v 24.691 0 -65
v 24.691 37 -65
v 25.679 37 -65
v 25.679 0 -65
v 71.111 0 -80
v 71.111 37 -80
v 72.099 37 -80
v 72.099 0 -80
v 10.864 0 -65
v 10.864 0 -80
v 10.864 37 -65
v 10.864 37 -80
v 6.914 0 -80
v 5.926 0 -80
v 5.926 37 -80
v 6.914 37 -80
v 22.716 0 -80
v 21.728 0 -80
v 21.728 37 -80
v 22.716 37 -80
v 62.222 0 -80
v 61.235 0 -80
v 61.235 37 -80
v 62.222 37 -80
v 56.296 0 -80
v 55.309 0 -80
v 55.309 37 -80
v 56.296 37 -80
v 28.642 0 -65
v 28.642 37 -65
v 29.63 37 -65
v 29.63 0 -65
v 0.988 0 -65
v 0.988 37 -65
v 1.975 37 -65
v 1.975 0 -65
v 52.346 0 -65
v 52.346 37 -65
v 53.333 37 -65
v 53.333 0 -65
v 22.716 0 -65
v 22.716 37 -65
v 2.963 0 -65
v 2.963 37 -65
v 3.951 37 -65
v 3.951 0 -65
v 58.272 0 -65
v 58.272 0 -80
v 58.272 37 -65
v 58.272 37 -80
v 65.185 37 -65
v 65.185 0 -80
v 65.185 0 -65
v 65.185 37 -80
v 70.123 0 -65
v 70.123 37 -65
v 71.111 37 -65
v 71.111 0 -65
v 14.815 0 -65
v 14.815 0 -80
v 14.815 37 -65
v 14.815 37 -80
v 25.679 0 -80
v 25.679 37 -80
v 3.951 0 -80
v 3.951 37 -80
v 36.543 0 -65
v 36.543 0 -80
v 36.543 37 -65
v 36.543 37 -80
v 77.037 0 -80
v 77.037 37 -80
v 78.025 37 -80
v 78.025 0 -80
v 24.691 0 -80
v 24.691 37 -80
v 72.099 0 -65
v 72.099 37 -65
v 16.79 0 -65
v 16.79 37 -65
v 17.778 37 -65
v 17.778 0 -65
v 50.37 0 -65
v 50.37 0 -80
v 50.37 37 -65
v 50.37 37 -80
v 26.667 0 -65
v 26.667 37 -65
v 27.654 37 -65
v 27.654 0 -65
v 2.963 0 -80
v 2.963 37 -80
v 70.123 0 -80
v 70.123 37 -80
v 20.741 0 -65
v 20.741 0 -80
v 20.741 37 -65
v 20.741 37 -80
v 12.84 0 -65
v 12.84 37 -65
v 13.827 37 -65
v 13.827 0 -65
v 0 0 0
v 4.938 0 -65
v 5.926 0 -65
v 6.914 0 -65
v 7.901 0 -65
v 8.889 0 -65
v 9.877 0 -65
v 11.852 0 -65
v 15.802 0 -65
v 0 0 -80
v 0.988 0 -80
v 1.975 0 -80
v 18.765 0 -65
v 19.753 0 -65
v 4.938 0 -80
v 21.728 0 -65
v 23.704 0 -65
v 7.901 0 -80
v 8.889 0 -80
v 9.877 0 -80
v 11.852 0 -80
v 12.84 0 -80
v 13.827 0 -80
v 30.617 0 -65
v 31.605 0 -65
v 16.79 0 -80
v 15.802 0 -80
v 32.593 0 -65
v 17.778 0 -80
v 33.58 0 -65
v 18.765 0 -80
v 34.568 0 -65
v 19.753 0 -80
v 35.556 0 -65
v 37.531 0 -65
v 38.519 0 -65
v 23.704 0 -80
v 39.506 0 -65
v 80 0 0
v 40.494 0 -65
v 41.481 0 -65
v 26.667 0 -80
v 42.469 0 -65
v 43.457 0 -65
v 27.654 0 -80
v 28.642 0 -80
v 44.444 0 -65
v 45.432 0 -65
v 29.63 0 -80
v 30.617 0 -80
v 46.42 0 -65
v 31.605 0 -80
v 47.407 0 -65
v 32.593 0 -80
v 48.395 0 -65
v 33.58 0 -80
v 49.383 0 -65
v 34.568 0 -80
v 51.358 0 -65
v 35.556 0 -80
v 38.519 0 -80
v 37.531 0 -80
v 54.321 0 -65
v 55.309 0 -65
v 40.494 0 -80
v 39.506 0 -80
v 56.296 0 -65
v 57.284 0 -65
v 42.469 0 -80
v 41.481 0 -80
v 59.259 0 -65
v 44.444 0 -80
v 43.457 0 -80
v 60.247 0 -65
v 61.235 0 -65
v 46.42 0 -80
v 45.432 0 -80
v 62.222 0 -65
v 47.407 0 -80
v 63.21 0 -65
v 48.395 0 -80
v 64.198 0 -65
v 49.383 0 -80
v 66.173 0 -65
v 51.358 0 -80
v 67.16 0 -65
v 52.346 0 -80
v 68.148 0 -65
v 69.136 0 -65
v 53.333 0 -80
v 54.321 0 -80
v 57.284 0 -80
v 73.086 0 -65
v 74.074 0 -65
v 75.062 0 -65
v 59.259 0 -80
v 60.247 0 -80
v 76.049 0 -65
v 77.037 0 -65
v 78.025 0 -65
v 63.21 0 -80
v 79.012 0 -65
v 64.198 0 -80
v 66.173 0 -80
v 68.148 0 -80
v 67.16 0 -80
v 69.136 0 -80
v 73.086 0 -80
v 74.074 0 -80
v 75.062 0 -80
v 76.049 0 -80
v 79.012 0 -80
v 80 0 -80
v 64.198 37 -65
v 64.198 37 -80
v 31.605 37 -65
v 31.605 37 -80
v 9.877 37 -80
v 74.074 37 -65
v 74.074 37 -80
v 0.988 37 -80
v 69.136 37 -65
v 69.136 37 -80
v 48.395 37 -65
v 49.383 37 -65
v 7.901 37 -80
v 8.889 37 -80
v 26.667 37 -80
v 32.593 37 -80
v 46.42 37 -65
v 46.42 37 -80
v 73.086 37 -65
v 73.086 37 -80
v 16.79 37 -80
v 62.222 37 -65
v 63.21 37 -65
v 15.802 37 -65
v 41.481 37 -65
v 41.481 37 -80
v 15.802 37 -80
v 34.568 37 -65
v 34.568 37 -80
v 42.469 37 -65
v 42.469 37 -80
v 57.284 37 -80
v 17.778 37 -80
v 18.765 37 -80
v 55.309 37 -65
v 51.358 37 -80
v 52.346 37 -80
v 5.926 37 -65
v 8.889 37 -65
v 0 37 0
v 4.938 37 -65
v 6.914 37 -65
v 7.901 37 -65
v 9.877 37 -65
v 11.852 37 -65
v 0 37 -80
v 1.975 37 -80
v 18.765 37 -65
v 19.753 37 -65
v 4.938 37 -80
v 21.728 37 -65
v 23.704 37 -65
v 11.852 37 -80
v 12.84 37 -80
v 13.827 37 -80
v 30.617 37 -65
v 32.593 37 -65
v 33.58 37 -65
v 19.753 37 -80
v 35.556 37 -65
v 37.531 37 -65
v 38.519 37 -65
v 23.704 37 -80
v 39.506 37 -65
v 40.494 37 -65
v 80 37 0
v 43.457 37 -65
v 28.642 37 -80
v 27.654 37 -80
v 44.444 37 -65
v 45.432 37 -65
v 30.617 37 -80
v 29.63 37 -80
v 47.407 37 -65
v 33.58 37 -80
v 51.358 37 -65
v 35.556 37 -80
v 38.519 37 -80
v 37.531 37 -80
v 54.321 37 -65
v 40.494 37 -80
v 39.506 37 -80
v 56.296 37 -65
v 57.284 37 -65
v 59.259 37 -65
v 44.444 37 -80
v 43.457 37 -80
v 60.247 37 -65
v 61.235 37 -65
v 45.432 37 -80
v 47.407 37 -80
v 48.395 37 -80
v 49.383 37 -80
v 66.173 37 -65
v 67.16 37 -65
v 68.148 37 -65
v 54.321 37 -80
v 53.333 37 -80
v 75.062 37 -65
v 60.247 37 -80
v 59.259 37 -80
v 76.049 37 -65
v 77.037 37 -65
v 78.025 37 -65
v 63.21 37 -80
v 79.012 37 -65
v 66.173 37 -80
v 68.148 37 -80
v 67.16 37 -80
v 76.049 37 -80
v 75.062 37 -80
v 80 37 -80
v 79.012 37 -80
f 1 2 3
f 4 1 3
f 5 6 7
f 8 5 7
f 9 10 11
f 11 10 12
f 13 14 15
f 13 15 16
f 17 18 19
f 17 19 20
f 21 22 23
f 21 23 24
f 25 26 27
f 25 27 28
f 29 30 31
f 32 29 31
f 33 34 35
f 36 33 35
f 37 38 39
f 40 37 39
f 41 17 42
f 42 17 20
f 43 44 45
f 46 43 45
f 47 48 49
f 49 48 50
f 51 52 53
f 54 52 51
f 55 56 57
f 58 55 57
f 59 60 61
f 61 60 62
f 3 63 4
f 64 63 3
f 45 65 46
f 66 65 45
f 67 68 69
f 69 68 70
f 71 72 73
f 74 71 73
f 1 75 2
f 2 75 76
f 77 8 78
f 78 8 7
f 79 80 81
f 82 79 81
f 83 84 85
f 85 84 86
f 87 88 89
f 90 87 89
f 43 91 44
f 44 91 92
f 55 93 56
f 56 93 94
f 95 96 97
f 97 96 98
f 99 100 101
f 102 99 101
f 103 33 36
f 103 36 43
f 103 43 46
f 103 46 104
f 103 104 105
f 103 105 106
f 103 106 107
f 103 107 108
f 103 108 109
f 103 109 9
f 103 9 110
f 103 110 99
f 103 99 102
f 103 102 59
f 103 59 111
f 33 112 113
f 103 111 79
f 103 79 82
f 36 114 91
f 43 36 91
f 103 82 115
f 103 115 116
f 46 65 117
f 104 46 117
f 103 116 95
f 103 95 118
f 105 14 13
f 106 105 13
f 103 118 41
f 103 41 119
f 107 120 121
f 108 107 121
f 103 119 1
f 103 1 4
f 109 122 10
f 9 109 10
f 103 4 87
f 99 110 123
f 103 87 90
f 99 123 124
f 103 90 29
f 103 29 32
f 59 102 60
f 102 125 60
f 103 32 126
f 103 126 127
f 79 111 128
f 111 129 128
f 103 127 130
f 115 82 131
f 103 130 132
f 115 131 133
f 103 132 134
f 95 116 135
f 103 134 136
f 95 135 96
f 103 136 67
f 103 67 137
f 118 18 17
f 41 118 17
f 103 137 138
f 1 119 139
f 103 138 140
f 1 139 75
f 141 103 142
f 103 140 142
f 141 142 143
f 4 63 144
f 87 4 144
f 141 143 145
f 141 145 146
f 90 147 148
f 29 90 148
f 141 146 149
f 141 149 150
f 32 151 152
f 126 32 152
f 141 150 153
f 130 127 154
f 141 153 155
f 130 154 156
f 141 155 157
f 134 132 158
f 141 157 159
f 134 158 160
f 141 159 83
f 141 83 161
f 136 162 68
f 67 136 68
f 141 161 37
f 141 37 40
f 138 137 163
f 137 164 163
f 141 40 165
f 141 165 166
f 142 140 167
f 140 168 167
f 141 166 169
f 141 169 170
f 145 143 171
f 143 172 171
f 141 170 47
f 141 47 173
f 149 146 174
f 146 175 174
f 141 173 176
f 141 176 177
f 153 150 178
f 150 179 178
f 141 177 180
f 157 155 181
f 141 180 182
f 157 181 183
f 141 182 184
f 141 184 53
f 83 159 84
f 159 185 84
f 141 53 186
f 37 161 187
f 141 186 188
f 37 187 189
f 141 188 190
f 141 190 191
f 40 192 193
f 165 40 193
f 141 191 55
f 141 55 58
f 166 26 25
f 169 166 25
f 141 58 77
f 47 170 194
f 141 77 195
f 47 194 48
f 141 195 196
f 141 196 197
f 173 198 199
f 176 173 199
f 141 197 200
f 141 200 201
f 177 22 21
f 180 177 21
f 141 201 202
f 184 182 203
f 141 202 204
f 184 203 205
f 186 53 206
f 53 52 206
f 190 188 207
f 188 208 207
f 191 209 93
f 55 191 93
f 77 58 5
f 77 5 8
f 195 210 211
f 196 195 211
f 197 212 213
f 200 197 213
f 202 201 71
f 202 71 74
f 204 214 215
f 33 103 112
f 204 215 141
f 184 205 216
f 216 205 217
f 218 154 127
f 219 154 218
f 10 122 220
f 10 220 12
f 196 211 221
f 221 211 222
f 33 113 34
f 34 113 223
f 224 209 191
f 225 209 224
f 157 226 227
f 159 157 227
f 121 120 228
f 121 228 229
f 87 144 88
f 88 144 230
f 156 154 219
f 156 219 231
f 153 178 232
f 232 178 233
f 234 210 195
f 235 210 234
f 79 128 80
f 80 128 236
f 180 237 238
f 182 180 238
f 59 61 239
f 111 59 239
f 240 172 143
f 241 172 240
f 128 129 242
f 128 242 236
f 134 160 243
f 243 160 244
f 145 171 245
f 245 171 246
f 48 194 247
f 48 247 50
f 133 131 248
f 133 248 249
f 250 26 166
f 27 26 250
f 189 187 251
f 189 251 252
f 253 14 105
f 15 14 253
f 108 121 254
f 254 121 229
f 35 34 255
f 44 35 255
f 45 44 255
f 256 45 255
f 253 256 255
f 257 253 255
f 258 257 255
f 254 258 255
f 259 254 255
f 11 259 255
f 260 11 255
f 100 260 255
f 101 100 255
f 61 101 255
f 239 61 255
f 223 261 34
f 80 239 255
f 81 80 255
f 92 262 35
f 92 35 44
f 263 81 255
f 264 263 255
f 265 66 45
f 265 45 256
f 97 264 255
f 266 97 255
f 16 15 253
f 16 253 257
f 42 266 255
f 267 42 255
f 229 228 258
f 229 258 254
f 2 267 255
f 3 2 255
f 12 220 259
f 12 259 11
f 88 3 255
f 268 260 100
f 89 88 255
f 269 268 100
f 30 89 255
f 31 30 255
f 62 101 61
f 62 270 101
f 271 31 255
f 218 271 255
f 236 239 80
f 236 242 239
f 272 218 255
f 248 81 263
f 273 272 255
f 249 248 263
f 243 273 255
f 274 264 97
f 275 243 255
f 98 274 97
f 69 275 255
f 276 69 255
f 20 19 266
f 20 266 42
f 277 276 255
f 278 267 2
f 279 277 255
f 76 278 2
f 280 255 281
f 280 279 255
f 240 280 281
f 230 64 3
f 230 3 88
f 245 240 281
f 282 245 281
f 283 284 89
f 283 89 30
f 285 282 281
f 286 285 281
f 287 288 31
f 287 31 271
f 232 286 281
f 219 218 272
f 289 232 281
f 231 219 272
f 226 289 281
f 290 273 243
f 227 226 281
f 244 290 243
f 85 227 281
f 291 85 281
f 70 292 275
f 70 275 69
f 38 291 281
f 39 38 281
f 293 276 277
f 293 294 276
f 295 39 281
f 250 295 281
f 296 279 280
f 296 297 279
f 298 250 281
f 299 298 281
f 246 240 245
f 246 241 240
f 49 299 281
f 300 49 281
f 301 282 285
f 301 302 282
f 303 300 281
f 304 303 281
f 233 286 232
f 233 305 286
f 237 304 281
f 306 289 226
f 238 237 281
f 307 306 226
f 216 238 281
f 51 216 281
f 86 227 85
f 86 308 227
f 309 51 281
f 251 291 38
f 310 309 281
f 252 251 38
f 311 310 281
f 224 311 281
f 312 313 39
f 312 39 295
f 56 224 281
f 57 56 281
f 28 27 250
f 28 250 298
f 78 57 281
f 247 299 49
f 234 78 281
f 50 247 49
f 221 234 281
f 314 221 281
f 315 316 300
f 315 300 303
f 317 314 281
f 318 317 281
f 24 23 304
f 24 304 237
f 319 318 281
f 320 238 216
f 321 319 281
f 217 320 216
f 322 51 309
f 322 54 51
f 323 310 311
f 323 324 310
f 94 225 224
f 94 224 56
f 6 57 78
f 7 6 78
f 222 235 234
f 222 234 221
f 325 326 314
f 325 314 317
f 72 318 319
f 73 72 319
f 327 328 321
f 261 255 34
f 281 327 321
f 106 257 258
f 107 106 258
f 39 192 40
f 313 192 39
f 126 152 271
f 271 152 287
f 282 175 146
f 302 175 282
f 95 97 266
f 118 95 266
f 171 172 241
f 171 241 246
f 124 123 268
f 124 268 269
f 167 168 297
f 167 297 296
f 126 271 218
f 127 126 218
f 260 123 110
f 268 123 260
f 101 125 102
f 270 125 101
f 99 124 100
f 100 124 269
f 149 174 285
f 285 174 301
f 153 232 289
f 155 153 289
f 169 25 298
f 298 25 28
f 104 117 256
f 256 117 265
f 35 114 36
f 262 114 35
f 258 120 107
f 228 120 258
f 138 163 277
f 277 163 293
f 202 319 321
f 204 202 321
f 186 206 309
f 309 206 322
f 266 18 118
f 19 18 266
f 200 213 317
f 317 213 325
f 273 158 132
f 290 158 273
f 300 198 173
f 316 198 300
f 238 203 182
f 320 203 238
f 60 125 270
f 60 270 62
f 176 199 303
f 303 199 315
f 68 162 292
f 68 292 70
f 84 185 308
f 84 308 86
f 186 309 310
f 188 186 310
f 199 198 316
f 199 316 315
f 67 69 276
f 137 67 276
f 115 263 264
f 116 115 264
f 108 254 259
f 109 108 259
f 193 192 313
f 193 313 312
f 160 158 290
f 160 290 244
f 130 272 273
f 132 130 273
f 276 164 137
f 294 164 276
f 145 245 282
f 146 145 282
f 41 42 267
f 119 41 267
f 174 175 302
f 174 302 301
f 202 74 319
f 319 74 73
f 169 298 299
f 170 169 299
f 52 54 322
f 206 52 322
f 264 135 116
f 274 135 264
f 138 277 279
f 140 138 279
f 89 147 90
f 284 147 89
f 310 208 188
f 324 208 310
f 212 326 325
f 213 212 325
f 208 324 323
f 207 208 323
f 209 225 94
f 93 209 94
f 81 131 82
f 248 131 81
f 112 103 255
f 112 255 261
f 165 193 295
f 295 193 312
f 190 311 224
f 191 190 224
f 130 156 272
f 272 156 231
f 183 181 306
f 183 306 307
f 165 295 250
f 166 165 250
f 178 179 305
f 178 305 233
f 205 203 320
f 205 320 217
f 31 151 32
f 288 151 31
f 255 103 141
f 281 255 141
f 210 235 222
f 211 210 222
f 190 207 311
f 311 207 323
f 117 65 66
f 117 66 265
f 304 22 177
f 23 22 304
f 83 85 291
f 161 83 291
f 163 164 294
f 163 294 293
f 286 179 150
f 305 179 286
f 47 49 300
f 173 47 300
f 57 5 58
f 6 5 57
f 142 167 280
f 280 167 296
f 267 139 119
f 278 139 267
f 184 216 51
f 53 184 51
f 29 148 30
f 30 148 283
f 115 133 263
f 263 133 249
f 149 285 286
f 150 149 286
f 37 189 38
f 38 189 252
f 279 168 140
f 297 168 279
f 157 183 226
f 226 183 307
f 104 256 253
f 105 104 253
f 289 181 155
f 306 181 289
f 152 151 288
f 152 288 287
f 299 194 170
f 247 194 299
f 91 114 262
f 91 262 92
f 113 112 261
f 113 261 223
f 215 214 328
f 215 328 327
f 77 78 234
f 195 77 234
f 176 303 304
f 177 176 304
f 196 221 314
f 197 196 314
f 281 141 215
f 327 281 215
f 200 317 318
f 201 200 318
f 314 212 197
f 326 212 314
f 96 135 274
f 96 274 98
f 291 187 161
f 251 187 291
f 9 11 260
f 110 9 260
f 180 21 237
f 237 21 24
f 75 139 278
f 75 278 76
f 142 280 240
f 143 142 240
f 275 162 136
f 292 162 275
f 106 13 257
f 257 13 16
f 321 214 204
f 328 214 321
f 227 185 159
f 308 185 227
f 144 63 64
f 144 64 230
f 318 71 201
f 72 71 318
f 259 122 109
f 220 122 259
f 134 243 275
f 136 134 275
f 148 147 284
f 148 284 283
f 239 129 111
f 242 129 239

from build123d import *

# Parameters (mm, degrees)
SKETCH1_W                  = 80
SKETCH1_H                  = 80
EXTRUDE1_DEPTH             = 37
ESQUISSE1_W                = 0.987654321
ESQUISSE1_H                = 37
ENL_V_MAT_EXTRU_1_DEPTH    = 15
R_P_TITION_LIN_AIRE1_COUNT = 40
R_P_TITION_LIN_AIRE1_PITCH = 1.975308642


with BuildPart() as part:
    # Sketch1 → Extrude1 (new body)
    with BuildSketch(Plane(origin=(0, 0, 0), x_dir=(1, 0, 0), z_dir=(0, 1, 0))):
        with Locations((40, 40)):
            Rectangle(SKETCH1_W, SKETCH1_H)
    extrude(amount=EXTRUDE1_DEPTH)

    # Esquisse1 → Enlèv. mat.-Extru.1 (cut)
    with BuildSketch(Plane.XY.offset(-80)):
        with Locations((1.481481161, 18.5)):
            Rectangle(ESQUISSE1_W, ESQUISSE1_H)
    enl_v_mat_extru_1 = extrude(amount=ENL_V_MAT_EXTRU_1_DEPTH, mode=Mode.SUBTRACT)

    # Répétition linéaire1: Enlèv. mat.-Extru.1 ×40
    with Locations(*[(i * R_P_TITION_LIN_AIRE1_PITCH, 0, 0) for i in range(1, R_P_TITION_LIN_AIRE1_COUNT)]):
        add(enl_v_mat_extru_1, mode=Mode.SUBTRACT)


solid = part.part
